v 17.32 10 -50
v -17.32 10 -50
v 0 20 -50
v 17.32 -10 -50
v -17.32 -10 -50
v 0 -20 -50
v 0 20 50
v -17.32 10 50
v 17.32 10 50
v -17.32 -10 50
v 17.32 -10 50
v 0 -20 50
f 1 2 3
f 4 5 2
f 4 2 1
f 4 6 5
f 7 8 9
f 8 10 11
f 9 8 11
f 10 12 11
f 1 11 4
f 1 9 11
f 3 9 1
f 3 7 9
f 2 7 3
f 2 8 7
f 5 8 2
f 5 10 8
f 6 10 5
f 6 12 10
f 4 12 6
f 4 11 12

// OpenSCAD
// file: libpeginhole.scad
/*
 *  Copyright 2024-2025 AGH Center of Excellence in Artificial Intelligence
 *
 *  Licensed under the Apache License, Version 2.0 (the "License");
 *  you may not use this file except in compliance with the License.
 *  You may obtain a copy of the License at
 *
 *      http://www.apache.org/licenses/LICENSE-2.0
 *
 *  Unless required by applicable law or agreed to in writing, software
 *  distributed under the License is distributed on an "AS IS" BASIS,
 *  WITHOUT WARRANTIES OR CONDITIONS OF ANY KIND, either express or implied.
 *  See the License for the specific language governing permissions and
 *  limitations under the License.
 */
EPS = 0.001;

function circle_coordinate(x, r, p) = [ r * cos(x + p), r *sin(x + p) ];
function regular_shape_vertices(n = 3, r = 1, phase = 0) = [for (t = [0:360 / n:360 - EPS]) circle_coordinate(t, r, phase)];

/* Makes a single peg in form of regular prism
-  Args:
- @vertices: int - number of the base polygon vertices
- @diameter: num - the diameter of the circle to construct the vertices
- @height: num - the height of the prism
- @angle_offset: num - rotation of all vertices
- @is_cylinder: bool - flag to convert prism into cylinder
*/
module regular_prism(vertices, diameter, height, angle_offset, is_cylinder = false)
{
	if (is_cylinder) {
		cylinder(h = height, r = diameter / 2, center = true);
	} else if (vertices < 3) {
		echo("ERROR: Can't construct polygon with less than 3 vertices!");
	} else {
		linear_extrude(height = height, center = true) {
			if (vertices == 4) {
				square(diameter / sqrt(2), center = true);
			} else {
				points = regular_shape_vertices(n = vertices, r = diameter / 2, phase = angle_offset);
				polygon(points);
			}
		}
	}
}

/* Makes a single peghole
-  Args:
- @slot_size: num - the side of the box
- @depth: num - the thickness of the surface for insertion
- @height: num - the height of the whole box
- @leg_width: num - the side of the supporting legs
*/
module single_insertion_box(slot_size, depth, height, leg_width) {
	difference() {
		// Insertion surface
		cube([ slot_size, slot_size, height ], center = true);

		// Clearance (4 legs)
		translate([ 0, 0, -depth ]) cube([ slot_size + EPS, slot_size - 2 * leg_width, height ], center = true);
		translate([ 0, 0, -depth ]) cube([ slot_size - 2 * leg_width, slot_size + EPS, height ], center = true);

		// Peghole
		children(0);
	}
}

/* Makes multiple pegholes
-  Args:
- @slot_size: num - the side of the box
- @array_size: vec[int, int] - array dimensions of the holes grid
- @depth: num - the thickness of the surface for insertion
- @height: num - the height of the whole box
- @leg_width: num - the side of the supporting legs
*/
module multiple_insertion_box(slot_size, array_size, depth, height, leg_width) {
	box_dims = slot_size * array_size;
	difference() {
		// Insertion surface
		cube([ box_dims.x, box_dims.y, height ], center = true);

		// Clearance (4 legs)
		translate([ 0, 0, -depth ]) cube([ box_dims.x + EPS, box_dims.y - 2 * leg_width, height ], center = true);
		translate([ 0, 0, -depth ]) cube([ box_dims.x - 2 * leg_width, box_dims.y + EPS, height ], center = true);

		// Pegholes array
		array_offset = -box_dims / 2 + [ slot_size, slot_size ] / 2;
		for (cnt_y = [0:1:array_size.y - EPS]) {
			for (cnt_x = [0:1:array_size.x - EPS]) {
				dx = slot_size * cnt_x;
				dy = slot_size * cnt_y;
				child_idx = ((cnt_y * array_size.x) + cnt_x) % $children;

				translate([ array_offset.x + dx, array_offset.y + dy, 0 ]) children(child_idx);
			}
		}
	}
}
// main file
/*
 *  Copyright 2024-2025 AGH Center of Excellence in Artificial Intelligence
 *
 *  Licensed under the Apache License, Version 2.0 (the "License");
 *  you may not use this file except in compliance with the License.
 *  You may obtain a copy of the License at
 *
 *      http://www.apache.org/licenses/LICENSE-2.0
 *
 *  Unless required by applicable law or agreed to in writing, software
 *  distributed under the License is distributed on an "AS IS" BASIS,
 *  WITHOUT WARRANTIES OR CONDITIONS OF ANY KIND, either express or implied.
 *  See the License for the specific language governing permissions and
 *  limitations under the License.
 */
use<libpeginhole.scad> $fa = 1;
$fs = 0.4;

// Peg
rotation = [ 0, 0, 0 ];  // in degs
vertices = 6;
diameter = 40;
height = 100;
angle_offset = (360 / vertices) / 2;
is_cylinder = false;

rotate(rotation) regular_prism(
    vertices = vertices,
    diameter = diameter,
    height = height,
    angle_offset = angle_offset,
    is_cylinder = is_cylinder);
